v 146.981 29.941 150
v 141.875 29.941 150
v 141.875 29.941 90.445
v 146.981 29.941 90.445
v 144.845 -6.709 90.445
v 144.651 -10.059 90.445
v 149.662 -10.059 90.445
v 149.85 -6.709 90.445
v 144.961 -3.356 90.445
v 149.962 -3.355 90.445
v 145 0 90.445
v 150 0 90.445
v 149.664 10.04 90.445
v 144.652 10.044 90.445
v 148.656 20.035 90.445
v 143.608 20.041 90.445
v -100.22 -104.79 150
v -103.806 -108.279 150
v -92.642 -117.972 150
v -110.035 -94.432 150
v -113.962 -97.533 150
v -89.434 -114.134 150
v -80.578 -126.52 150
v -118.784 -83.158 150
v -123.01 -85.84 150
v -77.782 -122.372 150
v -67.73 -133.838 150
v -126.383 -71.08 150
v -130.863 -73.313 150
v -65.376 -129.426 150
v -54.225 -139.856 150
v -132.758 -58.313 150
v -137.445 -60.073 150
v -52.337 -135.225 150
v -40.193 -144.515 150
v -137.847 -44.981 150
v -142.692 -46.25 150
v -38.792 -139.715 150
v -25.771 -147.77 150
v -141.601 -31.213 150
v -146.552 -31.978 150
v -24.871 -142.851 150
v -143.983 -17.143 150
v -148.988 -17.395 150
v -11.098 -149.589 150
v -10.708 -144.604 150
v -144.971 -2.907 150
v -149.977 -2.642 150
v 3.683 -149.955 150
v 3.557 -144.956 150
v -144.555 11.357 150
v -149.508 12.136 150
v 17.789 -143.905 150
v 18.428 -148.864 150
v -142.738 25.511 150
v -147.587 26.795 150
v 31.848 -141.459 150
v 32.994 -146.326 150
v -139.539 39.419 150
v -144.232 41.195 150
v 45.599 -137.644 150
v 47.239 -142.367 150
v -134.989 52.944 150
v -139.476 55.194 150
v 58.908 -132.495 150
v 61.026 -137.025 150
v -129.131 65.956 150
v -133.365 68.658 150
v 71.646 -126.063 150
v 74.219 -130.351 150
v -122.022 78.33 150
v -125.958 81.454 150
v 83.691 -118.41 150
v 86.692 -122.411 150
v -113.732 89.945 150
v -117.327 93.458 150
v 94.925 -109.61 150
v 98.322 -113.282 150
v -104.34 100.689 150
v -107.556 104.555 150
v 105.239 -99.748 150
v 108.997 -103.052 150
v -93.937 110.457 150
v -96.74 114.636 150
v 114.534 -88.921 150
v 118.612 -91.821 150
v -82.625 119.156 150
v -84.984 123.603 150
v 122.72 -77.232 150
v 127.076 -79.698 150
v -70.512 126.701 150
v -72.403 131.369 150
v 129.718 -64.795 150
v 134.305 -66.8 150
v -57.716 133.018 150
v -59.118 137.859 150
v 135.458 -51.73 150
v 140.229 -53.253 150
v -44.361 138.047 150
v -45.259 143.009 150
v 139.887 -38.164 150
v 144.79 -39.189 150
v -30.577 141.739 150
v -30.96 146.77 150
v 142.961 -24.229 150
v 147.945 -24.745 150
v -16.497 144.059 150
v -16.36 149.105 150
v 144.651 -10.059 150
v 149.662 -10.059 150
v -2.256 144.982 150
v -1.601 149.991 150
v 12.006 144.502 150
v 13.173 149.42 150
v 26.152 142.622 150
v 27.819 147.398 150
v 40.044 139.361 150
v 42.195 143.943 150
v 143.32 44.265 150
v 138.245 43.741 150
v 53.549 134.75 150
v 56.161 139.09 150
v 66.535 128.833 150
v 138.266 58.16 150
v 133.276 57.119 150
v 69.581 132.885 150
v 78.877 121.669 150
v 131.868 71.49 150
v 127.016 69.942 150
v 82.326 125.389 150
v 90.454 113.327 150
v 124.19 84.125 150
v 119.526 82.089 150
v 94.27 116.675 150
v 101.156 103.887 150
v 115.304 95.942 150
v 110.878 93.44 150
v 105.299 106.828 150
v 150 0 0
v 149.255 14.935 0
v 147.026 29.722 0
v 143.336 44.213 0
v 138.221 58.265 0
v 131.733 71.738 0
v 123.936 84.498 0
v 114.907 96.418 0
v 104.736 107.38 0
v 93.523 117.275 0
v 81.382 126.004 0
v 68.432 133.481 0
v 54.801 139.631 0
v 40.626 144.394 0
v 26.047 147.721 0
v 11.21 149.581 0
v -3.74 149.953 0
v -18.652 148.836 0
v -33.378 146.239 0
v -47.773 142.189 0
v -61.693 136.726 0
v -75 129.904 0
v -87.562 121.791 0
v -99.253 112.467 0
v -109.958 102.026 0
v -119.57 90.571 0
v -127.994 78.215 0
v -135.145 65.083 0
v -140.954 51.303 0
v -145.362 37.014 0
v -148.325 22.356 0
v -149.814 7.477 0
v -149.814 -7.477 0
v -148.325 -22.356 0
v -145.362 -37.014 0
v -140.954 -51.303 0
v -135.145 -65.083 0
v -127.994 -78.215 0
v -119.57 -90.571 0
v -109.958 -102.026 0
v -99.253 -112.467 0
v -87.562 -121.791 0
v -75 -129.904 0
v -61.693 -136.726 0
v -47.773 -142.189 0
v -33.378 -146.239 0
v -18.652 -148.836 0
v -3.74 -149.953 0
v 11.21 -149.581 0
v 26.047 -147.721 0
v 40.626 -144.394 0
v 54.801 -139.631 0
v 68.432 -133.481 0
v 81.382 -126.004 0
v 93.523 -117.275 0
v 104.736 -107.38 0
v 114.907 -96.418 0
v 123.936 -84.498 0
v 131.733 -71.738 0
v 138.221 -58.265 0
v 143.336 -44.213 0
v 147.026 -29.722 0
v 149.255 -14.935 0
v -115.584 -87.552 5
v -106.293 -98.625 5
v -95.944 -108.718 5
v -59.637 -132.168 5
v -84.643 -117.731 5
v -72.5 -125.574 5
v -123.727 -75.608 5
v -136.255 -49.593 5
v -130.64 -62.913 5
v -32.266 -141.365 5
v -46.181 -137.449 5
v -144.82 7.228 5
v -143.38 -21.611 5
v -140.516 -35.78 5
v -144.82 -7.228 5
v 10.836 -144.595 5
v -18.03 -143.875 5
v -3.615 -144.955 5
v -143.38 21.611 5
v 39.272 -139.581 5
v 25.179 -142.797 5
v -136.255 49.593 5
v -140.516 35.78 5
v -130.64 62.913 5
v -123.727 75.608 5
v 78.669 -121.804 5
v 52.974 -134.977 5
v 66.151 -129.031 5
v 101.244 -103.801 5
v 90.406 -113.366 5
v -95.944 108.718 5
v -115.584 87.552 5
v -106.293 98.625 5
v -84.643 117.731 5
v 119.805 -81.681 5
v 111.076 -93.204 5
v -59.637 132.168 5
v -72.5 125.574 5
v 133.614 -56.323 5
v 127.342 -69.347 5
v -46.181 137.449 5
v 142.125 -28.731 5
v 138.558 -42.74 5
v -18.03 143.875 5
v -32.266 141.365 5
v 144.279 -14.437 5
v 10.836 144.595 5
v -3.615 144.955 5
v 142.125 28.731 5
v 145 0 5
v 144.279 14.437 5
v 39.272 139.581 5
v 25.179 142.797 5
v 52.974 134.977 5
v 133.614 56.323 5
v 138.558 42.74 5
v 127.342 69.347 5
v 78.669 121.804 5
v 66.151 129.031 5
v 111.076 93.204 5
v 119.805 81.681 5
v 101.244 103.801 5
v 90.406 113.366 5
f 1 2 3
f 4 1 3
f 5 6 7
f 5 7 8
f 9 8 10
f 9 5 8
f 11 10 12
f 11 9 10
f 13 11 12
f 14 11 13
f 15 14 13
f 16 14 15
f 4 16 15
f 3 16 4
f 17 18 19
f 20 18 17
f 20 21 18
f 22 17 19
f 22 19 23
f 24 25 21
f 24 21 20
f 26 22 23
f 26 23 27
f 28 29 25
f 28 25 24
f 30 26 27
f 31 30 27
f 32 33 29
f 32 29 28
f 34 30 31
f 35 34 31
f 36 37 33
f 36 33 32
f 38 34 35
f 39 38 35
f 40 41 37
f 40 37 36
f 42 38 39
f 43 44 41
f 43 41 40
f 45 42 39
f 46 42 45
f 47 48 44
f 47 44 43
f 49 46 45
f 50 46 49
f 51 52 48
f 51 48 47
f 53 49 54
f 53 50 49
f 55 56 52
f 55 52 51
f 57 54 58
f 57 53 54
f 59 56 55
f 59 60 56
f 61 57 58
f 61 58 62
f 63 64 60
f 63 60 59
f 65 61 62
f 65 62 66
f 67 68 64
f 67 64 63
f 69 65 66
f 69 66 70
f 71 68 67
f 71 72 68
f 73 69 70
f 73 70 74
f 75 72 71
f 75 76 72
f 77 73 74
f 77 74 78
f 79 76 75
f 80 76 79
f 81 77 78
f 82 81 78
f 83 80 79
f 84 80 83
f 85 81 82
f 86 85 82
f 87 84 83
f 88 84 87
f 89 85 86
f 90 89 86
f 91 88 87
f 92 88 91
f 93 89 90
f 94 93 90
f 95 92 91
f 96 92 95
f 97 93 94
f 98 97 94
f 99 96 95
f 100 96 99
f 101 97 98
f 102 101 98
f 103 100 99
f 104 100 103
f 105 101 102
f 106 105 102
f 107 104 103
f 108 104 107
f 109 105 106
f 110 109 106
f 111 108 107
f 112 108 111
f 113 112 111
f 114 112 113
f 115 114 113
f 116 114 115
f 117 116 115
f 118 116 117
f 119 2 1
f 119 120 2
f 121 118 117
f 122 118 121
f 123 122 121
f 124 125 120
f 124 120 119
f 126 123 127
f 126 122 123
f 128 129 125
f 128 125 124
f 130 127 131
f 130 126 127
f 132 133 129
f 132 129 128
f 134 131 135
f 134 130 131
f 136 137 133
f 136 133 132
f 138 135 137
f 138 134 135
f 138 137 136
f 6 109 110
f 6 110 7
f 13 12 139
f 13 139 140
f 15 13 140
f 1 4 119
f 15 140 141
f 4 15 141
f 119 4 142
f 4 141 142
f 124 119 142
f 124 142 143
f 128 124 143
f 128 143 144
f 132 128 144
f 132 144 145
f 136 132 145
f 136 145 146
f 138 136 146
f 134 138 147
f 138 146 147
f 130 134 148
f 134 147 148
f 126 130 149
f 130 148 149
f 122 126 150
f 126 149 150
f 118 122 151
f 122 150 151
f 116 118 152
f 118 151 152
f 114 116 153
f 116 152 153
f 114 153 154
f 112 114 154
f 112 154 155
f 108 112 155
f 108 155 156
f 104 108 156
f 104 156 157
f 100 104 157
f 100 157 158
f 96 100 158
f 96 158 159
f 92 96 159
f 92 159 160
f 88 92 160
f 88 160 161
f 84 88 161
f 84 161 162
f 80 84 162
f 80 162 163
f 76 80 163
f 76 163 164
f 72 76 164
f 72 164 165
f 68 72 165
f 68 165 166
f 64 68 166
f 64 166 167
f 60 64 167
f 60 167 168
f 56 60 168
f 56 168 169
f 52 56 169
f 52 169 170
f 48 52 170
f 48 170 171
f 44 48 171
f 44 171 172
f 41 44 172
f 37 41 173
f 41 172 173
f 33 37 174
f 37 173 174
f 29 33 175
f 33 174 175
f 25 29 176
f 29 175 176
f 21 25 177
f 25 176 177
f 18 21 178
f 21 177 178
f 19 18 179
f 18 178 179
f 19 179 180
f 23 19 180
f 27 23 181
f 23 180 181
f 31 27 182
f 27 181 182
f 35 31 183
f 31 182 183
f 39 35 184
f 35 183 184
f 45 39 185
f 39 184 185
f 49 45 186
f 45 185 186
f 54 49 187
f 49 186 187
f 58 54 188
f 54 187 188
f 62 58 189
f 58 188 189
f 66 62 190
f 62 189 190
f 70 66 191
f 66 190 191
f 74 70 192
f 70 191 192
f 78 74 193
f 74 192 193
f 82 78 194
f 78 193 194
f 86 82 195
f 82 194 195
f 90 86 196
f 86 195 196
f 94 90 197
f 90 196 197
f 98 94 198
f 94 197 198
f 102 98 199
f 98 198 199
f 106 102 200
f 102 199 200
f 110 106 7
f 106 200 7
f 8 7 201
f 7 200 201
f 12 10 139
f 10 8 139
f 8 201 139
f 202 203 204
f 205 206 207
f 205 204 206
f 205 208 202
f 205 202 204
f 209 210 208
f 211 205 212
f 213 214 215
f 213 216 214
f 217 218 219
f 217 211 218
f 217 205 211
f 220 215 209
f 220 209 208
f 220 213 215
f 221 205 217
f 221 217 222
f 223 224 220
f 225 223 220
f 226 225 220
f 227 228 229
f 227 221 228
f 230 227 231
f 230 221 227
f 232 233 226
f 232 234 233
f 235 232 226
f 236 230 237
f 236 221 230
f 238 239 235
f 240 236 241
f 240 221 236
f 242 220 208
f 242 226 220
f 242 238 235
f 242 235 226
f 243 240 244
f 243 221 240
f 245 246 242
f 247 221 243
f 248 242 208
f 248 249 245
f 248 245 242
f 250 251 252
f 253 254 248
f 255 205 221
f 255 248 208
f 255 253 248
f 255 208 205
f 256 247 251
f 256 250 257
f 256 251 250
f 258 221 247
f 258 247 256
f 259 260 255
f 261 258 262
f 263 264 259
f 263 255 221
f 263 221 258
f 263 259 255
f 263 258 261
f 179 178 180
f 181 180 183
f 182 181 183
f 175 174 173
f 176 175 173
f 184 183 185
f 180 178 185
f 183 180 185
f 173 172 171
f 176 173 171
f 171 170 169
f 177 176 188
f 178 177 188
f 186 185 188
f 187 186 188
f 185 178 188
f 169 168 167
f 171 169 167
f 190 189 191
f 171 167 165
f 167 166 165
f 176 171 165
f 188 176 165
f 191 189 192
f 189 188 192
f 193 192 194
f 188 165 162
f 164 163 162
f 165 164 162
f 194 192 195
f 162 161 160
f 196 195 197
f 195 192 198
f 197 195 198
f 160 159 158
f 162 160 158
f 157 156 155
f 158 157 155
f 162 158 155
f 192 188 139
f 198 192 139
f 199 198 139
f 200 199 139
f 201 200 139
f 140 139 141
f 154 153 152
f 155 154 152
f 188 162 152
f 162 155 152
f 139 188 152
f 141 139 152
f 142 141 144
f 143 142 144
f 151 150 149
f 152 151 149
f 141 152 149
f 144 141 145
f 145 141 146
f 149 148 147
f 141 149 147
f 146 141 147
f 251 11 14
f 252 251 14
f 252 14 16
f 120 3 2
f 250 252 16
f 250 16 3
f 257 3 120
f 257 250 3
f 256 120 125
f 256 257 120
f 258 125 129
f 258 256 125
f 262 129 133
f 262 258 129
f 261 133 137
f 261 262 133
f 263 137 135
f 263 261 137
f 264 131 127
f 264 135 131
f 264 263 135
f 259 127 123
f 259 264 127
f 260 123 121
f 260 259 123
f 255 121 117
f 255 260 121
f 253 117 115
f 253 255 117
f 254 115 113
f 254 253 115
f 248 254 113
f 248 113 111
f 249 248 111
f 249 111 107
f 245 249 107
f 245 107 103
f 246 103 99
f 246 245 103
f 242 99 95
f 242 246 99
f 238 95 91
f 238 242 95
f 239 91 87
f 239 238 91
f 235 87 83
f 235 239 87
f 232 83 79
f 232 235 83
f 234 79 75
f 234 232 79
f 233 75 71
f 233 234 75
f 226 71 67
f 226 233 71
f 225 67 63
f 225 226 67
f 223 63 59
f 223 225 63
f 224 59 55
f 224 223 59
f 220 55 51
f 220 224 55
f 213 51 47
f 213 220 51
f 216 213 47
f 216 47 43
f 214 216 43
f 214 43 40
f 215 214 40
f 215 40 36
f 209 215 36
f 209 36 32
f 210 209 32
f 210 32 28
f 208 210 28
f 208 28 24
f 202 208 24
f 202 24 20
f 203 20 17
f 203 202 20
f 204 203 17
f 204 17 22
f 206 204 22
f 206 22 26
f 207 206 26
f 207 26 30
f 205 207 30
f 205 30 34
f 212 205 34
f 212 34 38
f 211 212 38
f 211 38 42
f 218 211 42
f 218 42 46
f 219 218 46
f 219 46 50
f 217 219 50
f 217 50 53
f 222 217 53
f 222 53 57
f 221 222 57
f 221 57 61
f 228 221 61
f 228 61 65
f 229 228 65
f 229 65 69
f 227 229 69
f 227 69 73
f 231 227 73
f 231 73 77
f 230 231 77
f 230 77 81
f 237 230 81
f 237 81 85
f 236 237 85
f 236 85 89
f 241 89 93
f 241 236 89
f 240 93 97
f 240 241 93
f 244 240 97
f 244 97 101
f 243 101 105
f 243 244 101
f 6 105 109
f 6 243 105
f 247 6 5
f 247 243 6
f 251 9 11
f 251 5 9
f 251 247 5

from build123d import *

# Parameters (mm, degrees)
SKETCH1_R           = 150
BOSS_EXTRUDE1_DEPTH = 150
SHELL2_T            = -5
SKETCH4_W           = 60
SKETCH4_H           = 40
CUT_EXTRUDE1_DEPTH  = 150


with BuildPart() as part:
    # Sketch1 → Boss-Extrude1 (new body)
    with BuildSketch(Plane.XY):
        Circle(SKETCH1_R)
    extrude(amount=BOSS_EXTRUDE1_DEPTH)

    # Shell2
    shell2_openings = [part.faces().sort_by_distance(p)[0] for p in [
        (0, 0, 150),
    ]]
    offset(amount=SHELL2_T, openings=shell2_openings, kind=Kind.INTERSECTION)

    # Sketch4 → Cut-Extrude1 (cut)
    with BuildSketch(Plane(origin=(0, 0, 0), x_dir=(0, 0, -1), z_dir=(1, 0, 0))):
        with Locations((-120.445229028, 9.94063613)):
            Rectangle(SKETCH4_W, SKETCH4_H)
    extrude(amount=CUT_EXTRUDE1_DEPTH, mode=Mode.SUBTRACT)


solid = part.part
